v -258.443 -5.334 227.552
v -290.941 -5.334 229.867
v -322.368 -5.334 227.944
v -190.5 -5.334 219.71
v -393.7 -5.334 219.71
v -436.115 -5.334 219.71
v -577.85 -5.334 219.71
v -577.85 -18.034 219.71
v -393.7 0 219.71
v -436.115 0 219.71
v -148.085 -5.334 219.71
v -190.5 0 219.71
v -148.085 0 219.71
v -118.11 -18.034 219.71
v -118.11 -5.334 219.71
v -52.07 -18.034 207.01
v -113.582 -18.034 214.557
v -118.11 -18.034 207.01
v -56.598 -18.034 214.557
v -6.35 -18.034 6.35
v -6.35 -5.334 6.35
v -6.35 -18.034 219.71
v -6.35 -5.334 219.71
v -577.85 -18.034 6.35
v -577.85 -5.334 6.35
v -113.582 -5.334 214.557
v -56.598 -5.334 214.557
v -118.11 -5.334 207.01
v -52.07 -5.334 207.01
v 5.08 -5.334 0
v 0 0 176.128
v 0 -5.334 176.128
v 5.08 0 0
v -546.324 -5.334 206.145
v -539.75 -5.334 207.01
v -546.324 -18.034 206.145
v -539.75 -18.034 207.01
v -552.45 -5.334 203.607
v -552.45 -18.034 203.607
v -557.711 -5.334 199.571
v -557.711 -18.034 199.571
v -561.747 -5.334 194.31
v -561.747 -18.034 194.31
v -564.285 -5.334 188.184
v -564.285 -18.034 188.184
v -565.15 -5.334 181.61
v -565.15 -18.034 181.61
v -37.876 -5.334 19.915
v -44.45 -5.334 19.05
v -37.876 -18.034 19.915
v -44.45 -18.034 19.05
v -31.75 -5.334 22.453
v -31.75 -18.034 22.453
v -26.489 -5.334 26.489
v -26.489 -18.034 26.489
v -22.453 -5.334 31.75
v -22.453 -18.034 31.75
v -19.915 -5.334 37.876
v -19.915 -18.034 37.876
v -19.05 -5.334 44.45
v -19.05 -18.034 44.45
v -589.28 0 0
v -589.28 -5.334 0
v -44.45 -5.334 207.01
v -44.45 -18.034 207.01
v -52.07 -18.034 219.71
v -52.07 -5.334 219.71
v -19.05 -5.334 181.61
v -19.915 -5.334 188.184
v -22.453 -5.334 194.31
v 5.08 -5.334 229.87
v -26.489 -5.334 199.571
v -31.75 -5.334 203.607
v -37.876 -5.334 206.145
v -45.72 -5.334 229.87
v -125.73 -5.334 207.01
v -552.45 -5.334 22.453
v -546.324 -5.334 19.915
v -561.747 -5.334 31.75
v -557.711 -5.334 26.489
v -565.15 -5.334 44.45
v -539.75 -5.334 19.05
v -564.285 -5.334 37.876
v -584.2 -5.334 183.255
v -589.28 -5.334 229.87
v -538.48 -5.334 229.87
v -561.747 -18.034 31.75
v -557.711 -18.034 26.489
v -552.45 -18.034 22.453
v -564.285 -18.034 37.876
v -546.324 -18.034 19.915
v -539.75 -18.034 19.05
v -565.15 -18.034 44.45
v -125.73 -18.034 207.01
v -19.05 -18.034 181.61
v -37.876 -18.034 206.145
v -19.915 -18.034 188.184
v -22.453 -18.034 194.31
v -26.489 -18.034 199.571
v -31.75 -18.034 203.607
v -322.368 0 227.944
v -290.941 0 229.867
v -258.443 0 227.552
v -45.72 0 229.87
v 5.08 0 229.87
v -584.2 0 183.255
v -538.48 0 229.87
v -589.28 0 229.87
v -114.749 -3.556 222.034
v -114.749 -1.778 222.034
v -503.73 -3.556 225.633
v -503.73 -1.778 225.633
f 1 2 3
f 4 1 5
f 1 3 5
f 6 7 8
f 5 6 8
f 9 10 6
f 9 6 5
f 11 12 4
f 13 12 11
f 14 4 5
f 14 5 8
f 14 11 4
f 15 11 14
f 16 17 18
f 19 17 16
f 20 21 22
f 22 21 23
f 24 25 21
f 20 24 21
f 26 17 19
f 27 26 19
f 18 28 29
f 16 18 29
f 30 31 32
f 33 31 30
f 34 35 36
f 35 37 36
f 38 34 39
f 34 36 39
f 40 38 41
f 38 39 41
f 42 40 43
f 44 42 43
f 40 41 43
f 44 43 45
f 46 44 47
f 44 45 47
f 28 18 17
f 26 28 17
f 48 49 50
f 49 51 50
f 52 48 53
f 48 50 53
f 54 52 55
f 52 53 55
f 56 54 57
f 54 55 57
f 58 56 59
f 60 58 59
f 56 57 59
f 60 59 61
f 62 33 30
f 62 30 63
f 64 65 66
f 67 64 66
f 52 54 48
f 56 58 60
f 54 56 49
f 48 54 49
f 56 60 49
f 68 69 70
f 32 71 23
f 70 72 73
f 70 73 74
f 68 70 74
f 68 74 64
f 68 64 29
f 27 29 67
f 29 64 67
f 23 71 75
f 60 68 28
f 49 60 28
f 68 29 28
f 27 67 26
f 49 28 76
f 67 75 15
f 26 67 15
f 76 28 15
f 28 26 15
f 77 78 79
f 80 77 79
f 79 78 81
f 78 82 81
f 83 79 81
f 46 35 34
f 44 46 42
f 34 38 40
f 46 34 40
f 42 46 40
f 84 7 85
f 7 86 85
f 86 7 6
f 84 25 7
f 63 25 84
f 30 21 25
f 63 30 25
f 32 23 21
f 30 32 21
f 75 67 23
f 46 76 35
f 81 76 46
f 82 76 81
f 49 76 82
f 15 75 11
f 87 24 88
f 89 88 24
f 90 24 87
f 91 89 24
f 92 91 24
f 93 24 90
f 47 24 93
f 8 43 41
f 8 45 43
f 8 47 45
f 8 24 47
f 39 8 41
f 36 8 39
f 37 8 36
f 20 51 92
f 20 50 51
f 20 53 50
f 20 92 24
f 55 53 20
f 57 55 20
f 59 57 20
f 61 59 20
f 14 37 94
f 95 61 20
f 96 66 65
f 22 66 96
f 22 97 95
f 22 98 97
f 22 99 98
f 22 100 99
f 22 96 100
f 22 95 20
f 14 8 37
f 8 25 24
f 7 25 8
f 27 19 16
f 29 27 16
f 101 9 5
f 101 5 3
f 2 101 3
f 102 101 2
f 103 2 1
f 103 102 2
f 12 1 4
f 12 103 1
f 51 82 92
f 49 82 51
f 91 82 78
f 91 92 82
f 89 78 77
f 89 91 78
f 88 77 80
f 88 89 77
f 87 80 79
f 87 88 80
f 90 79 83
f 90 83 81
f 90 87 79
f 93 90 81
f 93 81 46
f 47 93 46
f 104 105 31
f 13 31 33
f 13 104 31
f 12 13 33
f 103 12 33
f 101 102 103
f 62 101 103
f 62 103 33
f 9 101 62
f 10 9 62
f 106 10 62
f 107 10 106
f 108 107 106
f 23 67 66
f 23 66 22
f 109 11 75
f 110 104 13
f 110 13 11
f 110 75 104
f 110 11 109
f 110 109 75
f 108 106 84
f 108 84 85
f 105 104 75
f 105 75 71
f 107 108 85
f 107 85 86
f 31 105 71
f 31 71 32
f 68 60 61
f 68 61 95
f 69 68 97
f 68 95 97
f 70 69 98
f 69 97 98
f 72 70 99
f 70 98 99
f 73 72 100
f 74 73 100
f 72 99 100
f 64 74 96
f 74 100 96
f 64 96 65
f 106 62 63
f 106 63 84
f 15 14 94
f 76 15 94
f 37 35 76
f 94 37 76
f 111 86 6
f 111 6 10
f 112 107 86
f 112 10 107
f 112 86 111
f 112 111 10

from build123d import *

# Parameters (mm, degrees)
F0_W     = 584.2
F0_H     = 219.71
F1_DEPTH = 5.334
F2_W     = 571.5
F2_H     = 213.36
F2_W_2   = 546.1
F2_H_2   = 187.96
F3_DEPTH = 12.7
F4_R     = 25.4
F6_DEPTH = 12.7
F8_DEPTH = 5.334


# Not quite as in the source:
# - a feature names something its author has since deleted; it is built from what else it names


with BuildPart() as f1:
    # F0 (on Front) → F1 (new body)
    with BuildSketch(Plane.XZ):
        with Locations((-292.1, 109.855)):
            Rectangle(F0_W, F0_H)
    extrude(amount=F1_DEPTH)

    # F2 (on face) → F3 (join)
    with BuildSketch(Plane.XZ.offset(5.334)):
        with Locations((-292.1, 113.03)):
            Rectangle(F2_W, F2_H)
        with Locations((-292.1, 113.03)):
            Rectangle(F2_W_2, F2_H_2, mode=Mode.SUBTRACT)
    extrude(amount=F3_DEPTH)

    # F4
    f4_edges = [f1.edges().sort_by_distance(p)[0] for p in [
        (-565.15, -11.684, 207.01),
        (-19.05, -11.684, 207.01),
        (-19.05, -11.684, 19.05),
        (-565.15, -11.684, 19.05),
    ]]
    fillet(f4_edges, radius=F4_R)

    # F5 (on face) → F6 (cut)
    with BuildSketch(Plane.XZ.offset(18.034)):
        Polygon((-118.11, 219.71), (-125.73, 207.01), (-118.11, 207.01), (-113.5820166854, 214.5566388576), (-110.49, 219.71), align=None)
        Polygon((-56.5979833146, 214.5566388576), (-52.07, 207.01), (-44.45, 207.01), (-52.07, 219.71), (-59.69, 219.71), align=None)
        Polygon((-59.69, 219.71), (-110.49, 219.71), (-113.5820166854, 214.5566388576), (-56.5979833146, 214.5566388576), align=None)
    extrude(amount=-F6_DEPTH, mode=Mode.SUBTRACT)

    # F7 (on face) → F8 (join)
    with BuildSketch(Plane(origin=(0, 0, 0), x_dir=(-1, 0, 0), z_dir=(0, 1, 0))):
        with BuildLine():
            Line((-5.08, 229.87), (0, 176.1275827885))
            Line((0, 176.1275827885), (0, 219.71))
            Line((0, 219.71), (148.0852009026, 219.71))
            add(Edge.make_bspline(
                [(148.0852009026, 219.71), (115.3779899576, 221.1840971885), (80.5489949788, 225.5270485943), (45.72, 229.87)],
                knots=[0.812101374, 0.812101374, 0.812101374, 0.812101374, 1, 1, 1, 1], degree=3))
            Line((45.72, 229.87), (-5.08, 229.87))
        make_face()
        with BuildLine():
            add(Edge.make_bspline(
                [(393.7, 219.71), (356.8171998762, 221.731425099), (324.4585999381, 229.87), (292.1, 229.87)],
                knots=[0.2719218593, 0.2719218593, 0.2719218593, 0.2719218593, 0.5, 0.5, 0.5, 0.5], degree=3))
            add(Edge.make_bspline(
                [(292.1, 229.87), (259.7414000619, 229.87), (227.3828001238, 221.731425099), (190.5, 219.71)],
                knots=[0.5, 0.5, 0.5, 0.5, 0.7280781407, 0.7280781407, 0.7280781407, 0.7280781407], degree=3))
            Line((190.5, 219.71), (393.7, 219.71))
        make_face()
        Polygon((584.2, 183.2547038794), (584.2, 0), (589.28, 0), align=None)
        with BuildLine():
            Line((584.2, 219.71), (584.2, 183.2547038794))
            Line((584.2, 183.2547038794), (589.28, 229.87))
            Line((589.28, 229.87), (538.48, 229.87))
            add(Edge.make_bspline(
                [(538.48, 229.87), (503.6510050212, 225.5270485943), (468.8220100424, 221.1840971885), (436.1147990974, 219.71)],
                knots=[0, 0, 0, 0, 0.187898626, 0.187898626, 0.187898626, 0.187898626], degree=3))
            Line((436.1147990974, 219.71), (584.2, 219.71))
        make_face()
        Polygon((-5.08, 0), (0, 0), (0, 176.1275827885), align=None)
    extrude(amount=-F8_DEPTH)


solid = f1.part
